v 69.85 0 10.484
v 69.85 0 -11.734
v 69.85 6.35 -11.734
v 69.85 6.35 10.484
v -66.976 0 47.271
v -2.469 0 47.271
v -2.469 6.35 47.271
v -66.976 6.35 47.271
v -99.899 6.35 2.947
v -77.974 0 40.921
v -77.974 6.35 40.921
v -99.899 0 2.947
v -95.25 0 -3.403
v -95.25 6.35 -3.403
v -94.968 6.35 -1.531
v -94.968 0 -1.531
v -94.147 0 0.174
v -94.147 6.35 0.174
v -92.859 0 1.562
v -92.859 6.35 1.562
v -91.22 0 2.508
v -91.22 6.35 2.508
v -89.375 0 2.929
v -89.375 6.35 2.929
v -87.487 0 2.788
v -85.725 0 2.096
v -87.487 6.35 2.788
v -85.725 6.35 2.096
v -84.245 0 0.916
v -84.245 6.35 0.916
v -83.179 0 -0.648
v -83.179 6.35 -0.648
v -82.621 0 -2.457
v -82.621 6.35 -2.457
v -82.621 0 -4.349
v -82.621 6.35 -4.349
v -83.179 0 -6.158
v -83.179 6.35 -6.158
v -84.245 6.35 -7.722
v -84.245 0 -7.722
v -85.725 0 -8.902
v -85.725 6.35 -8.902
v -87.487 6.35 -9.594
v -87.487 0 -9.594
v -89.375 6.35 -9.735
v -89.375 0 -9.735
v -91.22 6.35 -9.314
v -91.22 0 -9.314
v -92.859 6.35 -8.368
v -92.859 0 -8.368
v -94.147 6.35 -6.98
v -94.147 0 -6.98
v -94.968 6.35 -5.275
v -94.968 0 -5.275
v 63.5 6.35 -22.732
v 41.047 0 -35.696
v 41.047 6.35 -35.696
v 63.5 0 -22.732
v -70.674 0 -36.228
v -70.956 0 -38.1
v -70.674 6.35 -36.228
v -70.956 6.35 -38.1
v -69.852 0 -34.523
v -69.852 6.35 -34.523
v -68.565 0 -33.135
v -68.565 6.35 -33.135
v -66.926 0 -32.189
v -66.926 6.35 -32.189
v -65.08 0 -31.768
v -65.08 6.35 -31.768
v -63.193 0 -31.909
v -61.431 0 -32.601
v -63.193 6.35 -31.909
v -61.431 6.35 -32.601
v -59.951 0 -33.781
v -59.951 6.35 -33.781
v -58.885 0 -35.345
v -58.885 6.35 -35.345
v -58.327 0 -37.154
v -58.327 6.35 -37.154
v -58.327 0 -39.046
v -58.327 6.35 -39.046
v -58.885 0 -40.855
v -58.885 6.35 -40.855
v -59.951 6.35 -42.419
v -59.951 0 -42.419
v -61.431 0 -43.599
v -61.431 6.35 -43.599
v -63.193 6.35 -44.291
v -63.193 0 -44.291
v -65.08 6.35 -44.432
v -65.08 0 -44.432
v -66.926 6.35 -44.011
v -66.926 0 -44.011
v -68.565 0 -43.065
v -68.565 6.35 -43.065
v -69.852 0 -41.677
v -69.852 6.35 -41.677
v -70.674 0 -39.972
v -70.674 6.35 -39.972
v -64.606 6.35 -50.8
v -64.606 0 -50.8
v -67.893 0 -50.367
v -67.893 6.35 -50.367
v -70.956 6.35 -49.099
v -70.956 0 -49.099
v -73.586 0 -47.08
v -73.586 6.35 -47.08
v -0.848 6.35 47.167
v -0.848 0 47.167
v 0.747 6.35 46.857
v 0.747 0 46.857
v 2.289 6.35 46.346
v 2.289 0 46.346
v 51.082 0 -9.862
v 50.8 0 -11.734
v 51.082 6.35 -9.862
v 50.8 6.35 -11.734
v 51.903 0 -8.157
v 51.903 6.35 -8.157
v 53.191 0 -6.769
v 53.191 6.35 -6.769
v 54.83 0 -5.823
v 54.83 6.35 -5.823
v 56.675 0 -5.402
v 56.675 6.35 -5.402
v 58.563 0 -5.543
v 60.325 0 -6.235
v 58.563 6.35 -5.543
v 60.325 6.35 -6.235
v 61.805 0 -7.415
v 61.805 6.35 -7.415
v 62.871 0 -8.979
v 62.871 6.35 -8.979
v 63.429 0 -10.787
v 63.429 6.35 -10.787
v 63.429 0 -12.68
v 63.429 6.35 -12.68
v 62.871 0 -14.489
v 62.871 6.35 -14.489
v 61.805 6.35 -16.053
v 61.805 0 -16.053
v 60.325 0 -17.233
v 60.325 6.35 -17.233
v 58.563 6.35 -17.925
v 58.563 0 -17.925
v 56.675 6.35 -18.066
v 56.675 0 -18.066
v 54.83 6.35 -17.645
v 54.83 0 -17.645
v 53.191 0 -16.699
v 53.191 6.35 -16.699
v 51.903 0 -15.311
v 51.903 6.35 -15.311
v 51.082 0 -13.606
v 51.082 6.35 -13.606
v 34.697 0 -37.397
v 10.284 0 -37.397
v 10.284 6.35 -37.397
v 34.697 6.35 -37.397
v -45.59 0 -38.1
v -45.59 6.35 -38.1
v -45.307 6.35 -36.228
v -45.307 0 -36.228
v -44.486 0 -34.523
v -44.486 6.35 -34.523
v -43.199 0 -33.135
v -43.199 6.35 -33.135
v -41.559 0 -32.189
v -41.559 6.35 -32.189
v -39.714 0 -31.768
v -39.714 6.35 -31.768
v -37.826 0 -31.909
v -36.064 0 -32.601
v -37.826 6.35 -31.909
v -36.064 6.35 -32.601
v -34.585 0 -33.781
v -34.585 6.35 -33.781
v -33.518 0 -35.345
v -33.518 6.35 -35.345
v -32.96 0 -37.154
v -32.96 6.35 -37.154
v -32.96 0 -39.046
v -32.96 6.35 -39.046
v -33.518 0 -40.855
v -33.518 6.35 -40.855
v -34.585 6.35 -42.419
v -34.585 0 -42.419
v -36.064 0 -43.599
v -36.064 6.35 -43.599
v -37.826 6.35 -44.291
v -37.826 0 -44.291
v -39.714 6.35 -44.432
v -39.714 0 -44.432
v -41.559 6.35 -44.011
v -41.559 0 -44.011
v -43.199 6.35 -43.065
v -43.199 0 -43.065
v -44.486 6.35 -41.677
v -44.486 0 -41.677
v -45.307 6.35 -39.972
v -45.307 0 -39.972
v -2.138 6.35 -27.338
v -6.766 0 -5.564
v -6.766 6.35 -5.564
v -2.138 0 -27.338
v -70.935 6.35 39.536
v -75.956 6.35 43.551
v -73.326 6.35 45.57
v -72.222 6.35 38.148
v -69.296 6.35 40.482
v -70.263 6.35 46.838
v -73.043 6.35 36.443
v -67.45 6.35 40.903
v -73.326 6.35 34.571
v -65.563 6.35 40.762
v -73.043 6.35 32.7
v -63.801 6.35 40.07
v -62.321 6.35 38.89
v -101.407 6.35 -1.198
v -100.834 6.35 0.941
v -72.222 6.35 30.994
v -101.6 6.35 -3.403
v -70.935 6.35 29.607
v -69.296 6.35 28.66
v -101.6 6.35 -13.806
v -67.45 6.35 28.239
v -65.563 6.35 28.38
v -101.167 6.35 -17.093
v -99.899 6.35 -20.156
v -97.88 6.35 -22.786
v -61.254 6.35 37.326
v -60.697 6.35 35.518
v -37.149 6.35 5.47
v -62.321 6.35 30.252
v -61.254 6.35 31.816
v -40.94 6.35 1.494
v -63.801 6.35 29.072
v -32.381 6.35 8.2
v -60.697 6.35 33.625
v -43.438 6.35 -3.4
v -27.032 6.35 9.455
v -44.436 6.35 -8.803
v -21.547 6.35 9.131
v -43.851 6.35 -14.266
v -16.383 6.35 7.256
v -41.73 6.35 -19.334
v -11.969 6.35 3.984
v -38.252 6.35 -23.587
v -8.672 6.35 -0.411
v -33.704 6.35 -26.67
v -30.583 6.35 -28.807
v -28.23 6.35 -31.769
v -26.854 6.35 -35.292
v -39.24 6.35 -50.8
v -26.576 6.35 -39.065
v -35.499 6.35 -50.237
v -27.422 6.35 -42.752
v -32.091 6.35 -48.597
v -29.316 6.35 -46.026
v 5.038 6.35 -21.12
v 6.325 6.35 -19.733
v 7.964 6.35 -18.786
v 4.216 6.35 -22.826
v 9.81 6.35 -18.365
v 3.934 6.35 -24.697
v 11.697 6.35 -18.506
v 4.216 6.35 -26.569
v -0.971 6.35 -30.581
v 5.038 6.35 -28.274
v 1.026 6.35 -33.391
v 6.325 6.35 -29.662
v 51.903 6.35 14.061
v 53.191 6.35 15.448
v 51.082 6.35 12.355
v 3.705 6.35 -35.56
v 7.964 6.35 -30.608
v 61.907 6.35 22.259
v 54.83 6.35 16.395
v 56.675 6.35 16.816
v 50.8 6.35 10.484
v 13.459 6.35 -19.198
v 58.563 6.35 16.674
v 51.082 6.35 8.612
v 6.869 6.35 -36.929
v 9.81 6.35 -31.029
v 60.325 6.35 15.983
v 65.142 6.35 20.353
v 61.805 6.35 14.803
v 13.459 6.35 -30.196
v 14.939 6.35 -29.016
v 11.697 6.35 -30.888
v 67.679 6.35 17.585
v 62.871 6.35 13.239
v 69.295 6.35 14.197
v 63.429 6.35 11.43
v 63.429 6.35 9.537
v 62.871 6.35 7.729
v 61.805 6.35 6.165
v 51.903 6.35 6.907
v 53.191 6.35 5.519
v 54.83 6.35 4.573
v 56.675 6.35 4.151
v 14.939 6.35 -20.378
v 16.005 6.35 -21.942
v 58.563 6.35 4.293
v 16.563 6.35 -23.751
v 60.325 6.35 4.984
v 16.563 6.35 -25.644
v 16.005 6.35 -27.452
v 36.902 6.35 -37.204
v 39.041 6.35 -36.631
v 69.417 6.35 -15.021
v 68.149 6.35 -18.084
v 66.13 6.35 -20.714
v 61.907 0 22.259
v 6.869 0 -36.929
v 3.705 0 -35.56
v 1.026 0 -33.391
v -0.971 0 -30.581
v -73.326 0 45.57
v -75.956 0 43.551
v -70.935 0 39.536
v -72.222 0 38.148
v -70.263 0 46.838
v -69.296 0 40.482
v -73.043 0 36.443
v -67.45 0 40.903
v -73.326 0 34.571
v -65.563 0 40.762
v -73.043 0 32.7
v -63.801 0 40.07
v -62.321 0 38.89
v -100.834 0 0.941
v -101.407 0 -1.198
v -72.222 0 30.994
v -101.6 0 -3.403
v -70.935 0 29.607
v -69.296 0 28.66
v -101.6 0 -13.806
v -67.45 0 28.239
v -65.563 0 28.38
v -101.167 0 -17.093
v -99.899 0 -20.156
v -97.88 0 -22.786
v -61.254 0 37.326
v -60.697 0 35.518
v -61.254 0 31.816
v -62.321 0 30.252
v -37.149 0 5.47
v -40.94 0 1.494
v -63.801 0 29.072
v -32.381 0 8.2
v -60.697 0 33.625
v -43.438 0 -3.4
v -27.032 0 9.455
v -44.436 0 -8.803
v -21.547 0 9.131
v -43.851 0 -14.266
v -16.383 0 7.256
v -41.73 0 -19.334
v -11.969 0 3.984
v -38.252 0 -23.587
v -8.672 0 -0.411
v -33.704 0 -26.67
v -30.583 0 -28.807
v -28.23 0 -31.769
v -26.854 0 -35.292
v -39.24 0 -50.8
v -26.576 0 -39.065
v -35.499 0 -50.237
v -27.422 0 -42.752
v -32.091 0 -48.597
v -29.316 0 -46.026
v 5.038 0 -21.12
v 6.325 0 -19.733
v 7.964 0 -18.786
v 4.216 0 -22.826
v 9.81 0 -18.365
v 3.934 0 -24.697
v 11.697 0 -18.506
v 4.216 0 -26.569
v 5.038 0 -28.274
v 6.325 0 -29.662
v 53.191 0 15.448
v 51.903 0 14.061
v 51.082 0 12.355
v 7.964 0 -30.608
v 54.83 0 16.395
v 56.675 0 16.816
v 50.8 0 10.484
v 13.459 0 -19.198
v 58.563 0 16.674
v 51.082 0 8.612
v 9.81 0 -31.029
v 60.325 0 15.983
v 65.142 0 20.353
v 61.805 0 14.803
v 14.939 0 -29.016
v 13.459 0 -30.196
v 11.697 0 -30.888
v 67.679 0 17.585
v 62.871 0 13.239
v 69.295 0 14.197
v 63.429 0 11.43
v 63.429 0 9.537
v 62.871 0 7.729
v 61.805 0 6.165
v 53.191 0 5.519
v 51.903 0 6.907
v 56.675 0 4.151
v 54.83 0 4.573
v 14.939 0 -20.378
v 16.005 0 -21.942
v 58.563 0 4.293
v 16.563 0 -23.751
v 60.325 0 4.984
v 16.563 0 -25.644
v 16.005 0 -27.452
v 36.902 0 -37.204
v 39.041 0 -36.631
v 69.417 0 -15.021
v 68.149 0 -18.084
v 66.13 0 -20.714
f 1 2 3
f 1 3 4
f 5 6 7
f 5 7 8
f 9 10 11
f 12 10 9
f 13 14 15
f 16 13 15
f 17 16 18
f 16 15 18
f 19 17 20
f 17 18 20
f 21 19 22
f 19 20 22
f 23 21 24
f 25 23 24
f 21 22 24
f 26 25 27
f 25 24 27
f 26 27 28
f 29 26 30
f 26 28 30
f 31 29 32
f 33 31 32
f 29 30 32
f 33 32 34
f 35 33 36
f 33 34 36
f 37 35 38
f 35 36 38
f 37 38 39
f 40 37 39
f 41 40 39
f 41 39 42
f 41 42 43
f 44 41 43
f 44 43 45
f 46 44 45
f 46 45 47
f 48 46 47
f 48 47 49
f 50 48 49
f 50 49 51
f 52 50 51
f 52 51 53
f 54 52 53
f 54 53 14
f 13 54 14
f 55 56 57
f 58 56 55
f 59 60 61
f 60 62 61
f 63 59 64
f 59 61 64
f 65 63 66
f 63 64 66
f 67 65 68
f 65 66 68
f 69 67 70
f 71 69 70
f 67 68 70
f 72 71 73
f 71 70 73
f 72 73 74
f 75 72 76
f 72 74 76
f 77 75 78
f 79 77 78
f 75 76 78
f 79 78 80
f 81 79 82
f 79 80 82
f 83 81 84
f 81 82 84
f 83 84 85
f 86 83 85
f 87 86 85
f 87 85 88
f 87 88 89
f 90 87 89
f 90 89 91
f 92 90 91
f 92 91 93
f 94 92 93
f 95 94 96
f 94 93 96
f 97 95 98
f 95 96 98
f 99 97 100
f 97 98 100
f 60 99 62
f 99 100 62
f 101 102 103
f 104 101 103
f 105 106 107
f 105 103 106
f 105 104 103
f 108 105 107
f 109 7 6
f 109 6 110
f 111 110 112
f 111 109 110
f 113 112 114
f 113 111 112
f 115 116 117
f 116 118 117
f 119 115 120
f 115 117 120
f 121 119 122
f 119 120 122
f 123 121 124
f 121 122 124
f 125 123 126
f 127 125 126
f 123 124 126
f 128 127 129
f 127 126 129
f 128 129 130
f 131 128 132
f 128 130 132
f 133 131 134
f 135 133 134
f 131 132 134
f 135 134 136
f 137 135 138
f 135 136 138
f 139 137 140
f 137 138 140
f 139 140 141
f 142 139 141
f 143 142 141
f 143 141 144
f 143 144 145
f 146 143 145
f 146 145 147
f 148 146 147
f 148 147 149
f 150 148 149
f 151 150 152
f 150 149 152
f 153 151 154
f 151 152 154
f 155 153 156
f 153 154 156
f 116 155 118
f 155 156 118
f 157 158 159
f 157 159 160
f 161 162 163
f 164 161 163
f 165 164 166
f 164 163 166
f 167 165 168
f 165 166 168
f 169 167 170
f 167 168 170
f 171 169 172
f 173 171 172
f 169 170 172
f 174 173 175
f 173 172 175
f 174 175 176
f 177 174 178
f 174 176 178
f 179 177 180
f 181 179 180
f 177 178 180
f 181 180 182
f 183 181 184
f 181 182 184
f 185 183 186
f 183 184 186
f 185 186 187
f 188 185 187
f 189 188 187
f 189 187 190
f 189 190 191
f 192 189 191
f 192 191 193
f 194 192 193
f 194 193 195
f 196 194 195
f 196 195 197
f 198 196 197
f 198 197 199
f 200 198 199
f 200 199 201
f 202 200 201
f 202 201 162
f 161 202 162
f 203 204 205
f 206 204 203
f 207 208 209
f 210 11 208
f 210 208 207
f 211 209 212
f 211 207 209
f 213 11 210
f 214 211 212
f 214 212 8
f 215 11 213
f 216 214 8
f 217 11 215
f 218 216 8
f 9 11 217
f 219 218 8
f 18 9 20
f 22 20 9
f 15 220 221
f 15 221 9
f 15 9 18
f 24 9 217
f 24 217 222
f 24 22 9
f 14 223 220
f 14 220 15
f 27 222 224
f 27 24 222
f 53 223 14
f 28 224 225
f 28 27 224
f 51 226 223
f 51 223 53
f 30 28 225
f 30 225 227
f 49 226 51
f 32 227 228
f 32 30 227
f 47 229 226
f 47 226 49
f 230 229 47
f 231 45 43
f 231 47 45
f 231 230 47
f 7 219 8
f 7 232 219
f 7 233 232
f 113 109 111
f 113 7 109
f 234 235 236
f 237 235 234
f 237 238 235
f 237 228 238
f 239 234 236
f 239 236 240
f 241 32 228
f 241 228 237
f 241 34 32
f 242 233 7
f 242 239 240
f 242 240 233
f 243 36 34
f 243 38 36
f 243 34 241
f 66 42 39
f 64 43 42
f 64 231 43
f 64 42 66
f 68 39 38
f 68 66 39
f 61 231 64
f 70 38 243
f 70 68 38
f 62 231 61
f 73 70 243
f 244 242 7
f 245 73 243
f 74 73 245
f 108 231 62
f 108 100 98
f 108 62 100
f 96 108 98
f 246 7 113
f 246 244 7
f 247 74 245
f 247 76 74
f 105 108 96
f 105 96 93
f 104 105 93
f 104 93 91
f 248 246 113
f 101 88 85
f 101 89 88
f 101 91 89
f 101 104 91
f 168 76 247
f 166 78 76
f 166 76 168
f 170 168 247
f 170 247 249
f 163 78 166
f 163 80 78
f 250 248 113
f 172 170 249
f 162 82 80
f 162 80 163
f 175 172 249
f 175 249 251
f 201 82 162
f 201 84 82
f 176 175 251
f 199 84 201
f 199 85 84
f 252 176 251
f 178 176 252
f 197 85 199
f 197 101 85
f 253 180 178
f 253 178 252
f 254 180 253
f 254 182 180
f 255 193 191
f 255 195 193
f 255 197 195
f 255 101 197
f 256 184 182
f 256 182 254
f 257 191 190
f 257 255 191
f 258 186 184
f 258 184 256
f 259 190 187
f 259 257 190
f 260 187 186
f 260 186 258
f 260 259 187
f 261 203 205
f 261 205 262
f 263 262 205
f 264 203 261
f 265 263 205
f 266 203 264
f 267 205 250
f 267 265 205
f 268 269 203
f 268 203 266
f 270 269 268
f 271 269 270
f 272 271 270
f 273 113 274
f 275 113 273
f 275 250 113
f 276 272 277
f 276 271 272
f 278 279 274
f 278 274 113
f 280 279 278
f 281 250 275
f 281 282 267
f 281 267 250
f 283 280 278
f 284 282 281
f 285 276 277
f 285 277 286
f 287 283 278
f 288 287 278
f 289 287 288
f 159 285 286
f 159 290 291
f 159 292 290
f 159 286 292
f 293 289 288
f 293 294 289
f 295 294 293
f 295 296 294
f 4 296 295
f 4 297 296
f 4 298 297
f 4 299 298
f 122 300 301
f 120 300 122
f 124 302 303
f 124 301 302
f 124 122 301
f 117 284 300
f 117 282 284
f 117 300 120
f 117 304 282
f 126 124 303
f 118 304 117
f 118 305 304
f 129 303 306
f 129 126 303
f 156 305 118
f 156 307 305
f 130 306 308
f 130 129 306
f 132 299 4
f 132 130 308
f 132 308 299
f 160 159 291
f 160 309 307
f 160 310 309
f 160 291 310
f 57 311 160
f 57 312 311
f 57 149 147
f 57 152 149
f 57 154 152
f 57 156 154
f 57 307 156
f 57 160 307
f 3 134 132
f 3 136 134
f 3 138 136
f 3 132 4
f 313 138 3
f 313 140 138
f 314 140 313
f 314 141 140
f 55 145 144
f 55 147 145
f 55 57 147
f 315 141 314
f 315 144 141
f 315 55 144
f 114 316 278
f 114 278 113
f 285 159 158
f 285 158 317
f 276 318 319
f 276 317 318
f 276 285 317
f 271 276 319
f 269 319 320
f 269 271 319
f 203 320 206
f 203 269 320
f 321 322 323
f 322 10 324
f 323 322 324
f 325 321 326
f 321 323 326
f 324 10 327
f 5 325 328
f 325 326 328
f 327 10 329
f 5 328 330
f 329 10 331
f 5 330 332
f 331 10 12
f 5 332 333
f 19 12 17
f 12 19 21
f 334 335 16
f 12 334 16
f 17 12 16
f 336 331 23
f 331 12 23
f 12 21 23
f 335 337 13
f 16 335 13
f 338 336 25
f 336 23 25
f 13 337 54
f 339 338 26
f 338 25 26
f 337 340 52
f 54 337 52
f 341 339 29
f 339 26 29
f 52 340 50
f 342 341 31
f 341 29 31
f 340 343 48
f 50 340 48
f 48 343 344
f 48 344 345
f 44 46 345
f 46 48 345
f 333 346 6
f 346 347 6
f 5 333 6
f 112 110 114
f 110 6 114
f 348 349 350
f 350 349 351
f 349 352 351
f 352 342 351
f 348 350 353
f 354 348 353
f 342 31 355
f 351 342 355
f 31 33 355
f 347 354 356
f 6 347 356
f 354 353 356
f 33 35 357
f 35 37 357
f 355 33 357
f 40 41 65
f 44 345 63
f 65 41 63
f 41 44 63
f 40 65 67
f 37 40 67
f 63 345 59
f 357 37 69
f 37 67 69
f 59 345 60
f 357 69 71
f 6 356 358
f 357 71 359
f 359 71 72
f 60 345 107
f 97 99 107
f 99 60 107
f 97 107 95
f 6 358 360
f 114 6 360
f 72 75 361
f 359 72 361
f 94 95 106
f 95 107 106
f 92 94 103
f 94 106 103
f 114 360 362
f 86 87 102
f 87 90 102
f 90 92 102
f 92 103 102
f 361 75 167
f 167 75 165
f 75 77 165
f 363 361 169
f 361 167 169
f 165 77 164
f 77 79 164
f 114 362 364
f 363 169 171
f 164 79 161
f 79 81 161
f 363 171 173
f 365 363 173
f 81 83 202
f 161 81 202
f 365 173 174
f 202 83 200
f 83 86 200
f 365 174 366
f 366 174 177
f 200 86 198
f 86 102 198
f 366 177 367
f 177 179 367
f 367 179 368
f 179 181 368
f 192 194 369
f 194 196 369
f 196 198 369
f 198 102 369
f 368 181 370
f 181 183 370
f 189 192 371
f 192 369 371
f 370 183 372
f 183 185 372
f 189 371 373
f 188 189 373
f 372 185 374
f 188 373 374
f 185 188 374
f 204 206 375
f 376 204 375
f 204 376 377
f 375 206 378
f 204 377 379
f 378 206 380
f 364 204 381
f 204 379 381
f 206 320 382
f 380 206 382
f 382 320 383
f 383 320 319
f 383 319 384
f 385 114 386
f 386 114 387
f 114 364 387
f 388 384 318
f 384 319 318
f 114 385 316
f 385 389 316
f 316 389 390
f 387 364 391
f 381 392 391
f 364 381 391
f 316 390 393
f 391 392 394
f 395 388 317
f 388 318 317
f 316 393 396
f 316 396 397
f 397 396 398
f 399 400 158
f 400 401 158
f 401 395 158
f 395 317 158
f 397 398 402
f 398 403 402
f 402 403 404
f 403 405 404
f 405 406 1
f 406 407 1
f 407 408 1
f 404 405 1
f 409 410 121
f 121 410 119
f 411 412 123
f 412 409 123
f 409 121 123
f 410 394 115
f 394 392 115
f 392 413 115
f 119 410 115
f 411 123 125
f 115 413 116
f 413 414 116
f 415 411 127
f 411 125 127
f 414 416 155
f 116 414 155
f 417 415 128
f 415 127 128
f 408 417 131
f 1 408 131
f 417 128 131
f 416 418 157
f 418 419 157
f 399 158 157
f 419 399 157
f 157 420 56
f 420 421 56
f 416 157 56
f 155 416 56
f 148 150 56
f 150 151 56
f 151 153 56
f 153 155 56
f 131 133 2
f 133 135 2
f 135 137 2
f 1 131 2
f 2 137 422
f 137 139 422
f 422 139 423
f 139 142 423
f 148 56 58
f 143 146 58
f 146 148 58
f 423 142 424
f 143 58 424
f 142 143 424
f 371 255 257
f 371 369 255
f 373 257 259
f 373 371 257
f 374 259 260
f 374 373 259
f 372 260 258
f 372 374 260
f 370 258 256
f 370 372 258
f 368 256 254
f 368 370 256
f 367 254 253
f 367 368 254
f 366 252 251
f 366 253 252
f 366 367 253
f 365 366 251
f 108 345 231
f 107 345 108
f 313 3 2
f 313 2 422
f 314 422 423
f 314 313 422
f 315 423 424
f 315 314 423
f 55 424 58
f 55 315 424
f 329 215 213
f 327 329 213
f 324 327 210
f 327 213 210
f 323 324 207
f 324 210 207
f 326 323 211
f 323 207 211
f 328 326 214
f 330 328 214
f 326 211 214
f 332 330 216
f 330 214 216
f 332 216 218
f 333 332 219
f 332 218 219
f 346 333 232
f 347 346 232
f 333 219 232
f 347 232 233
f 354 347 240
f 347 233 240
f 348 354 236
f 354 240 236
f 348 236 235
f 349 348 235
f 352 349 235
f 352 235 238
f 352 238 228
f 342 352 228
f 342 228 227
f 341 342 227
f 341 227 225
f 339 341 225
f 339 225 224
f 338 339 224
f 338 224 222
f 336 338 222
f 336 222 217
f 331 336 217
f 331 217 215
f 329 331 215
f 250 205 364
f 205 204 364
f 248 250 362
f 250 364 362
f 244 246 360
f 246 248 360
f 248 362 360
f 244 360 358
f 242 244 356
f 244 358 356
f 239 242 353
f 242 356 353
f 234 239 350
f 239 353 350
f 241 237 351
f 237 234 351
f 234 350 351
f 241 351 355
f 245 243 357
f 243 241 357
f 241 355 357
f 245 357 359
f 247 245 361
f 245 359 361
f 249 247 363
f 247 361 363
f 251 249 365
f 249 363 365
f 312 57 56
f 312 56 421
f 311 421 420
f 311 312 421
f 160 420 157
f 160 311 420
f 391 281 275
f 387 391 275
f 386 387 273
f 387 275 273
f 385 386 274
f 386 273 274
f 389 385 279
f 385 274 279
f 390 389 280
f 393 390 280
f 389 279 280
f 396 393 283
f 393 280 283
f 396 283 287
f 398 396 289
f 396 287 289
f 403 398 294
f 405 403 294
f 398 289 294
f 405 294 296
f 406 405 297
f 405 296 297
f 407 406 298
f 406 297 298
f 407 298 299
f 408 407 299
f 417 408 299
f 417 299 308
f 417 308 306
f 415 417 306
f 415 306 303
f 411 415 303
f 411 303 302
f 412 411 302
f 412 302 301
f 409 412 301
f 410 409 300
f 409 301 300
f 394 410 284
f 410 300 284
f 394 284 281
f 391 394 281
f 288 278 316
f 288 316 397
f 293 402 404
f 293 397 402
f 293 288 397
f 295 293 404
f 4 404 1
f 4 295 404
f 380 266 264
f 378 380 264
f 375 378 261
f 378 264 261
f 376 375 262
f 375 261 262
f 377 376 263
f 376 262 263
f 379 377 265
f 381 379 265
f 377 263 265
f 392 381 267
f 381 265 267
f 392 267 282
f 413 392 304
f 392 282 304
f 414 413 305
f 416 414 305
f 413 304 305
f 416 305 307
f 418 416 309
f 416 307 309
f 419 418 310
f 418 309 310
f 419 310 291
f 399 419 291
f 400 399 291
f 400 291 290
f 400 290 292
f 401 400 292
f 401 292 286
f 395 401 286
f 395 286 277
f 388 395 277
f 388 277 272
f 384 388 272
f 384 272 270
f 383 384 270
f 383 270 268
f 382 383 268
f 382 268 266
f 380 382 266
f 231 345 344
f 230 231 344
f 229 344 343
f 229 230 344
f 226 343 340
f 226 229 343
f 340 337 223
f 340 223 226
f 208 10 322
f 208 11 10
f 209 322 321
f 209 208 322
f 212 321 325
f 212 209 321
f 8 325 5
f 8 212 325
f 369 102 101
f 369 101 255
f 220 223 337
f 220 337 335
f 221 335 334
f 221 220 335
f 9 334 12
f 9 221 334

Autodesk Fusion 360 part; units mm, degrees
sketch "Sketch1" plane through (0, 0, 0) normal (0, 1, 0) x (1, 0, 0)
  line L0 (-101.6, 0) -> (-101.6, 19.0663)
  line L1 (-101.6, 19.0663) -> (-69.8663, 50.8)
  line L2 (-69.8663, 50.8) -> (-39.2395, 50.8)
  arc A0 (-33.7037, 26.67) -> (-39.2395, 50.8) centre (-39.2395, 38.1) ccw
  arc A1 (-33.7037, 26.67) -> (-6.7663, 5.5643) centre (-25.4, 9.525) ccw
  line L3 (-6.7663, 5.5643) -> (0, 37.3972)
  line L4 (0, 37.3972) -> (38.1, 37.3972)
  line L5 (38.1, 37.3972) -> (69.85, 19.0663)
  line L6 (69.85, 19.0663) -> (69.85, -19.05)
  line L7 (69.85, -19.05) -> (0, -47.2712)
  line L8 (0, -47.2712) -> (-74.3079, -47.2712)
  line L9 (-74.3079, -47.2712) -> (-101.6, 0)
  dimension "d1" = 9.525
  dimension "d2" = 19.05
  dimension "d3" = 25.4
  dimension "d4" = 102
  dimension "d5" = 38.1
  dimension "d6" = 150
  dimension "d7" = 69.85
  dimension "d8" = 112
  dimension "d9" = 19.05
  dimension "d10" = 120
  dimension "d11" = 101.6
  dimension "d12" = 135
  dimension "d13" = 50.8
  dimension "d14" = 12.7
extrude "Extrude1" add sketch "Sketch1" along normal blind 6.35
fillet "Fillet1" radius 12.7 9 edges at (-69.8663, 3.175, -50.8) (-101.6, 3.175, -19.0663) (-101.6, 3.175, 0) (-74.3079, 3.175, 47.2712) (0, 3.175, 47.2712) (0, 3.175, -37.3972) (38.1, 3.175, -37.3972) (69.85, 3.175, -19.0663) (69.85, 3.175, 19.05)
sketch "Sketch2" plane through (0, 6.35, 0) normal (0, 1, 0) x (-1, 0, 0)
  arc A0 (-61.9075, 22.259) -> (-69.85, 10.4837) centre (-57.15, 10.4837) ccw
  line L0 (-69.85, 10.4837) -> (-69.85, -11.7339)
  arc A1 (-69.85, -11.7339) -> (-63.5, -22.7325) centre (-57.15, -11.7339) ccw
  line L1 (-63.5, -22.7325) -> (-41.047, -35.6957)
  arc A2 (-41.047, -35.6957) -> (-34.697, -37.3972) centre (-34.697, -24.6972) ccw
  line L2 (-34.697, -37.3972) -> (-10.2843, -37.3972)
  arc A3 (-10.2843, -37.3972) -> (2.1382, -27.3376) centre (-10.2843, -24.6972) ccw
  line L3 (2.1382, -27.3376) -> (6.7663, -5.5643)
  arc A4 (33.7037, -26.67) -> (6.7663, -5.5643) centre (25.4, -9.525) ccw
  arc A5 (33.7037, -26.67) -> (39.2395, -50.8) centre (39.2395, -38.1) ccw
  line L4 (39.2395, -50.8) -> (64.6058, -50.8)
  arc A6 (64.6058, -50.8) -> (73.586, -47.0803) centre (64.6058, -38.1) ccw
  line L5 (73.586, -47.0803) -> (97.8803, -22.786)
  arc A7 (97.8803, -22.786) -> (101.6, -13.8058) centre (88.9, -13.8058) ccw
  line L6 (101.6, -13.8058) -> (101.6, -3.403)
  arc A8 (101.6, -3.403) -> (99.8985, 2.947) centre (88.9, -3.403) ccw
  line L7 (99.8985, 2.947) -> (77.9741, 40.9212)
  arc A9 (77.9741, 40.9212) -> (66.9756, 47.2712) centre (66.9756, 34.5712) ccw
  line L8 (66.9756, 47.2712) -> (2.4686, 47.2712)
  arc A10 (2.4686, 47.2712) -> (-2.2889, 46.3465) centre (2.4686, 34.5712) ccw
  line L9 (-2.2889, 46.3465) -> (-61.9075, 22.259)
  circle A11 centre (64.6058, -38.1) radius 6.35
  circle A12 centre (39.2395, -38.1) radius 6.35
  circle A13 centre (-10.2843, -24.6972) radius 6.35
  circle A14 centre (-57.15, -11.7339) radius 6.35
  circle A15 centre (-57.15, 10.4837) radius 6.35
  circle A16 centre (66.9756, 34.5712) radius 6.35
  circle A17 centre (88.9, -3.403) radius 6.35
  dimension "d18" = 12.7
extrude "Extrude2" cut sketch "Sketch2" against normal blind 15.24 contours A11 | A12 | A13 | A14 | A15 | A16 | A17
